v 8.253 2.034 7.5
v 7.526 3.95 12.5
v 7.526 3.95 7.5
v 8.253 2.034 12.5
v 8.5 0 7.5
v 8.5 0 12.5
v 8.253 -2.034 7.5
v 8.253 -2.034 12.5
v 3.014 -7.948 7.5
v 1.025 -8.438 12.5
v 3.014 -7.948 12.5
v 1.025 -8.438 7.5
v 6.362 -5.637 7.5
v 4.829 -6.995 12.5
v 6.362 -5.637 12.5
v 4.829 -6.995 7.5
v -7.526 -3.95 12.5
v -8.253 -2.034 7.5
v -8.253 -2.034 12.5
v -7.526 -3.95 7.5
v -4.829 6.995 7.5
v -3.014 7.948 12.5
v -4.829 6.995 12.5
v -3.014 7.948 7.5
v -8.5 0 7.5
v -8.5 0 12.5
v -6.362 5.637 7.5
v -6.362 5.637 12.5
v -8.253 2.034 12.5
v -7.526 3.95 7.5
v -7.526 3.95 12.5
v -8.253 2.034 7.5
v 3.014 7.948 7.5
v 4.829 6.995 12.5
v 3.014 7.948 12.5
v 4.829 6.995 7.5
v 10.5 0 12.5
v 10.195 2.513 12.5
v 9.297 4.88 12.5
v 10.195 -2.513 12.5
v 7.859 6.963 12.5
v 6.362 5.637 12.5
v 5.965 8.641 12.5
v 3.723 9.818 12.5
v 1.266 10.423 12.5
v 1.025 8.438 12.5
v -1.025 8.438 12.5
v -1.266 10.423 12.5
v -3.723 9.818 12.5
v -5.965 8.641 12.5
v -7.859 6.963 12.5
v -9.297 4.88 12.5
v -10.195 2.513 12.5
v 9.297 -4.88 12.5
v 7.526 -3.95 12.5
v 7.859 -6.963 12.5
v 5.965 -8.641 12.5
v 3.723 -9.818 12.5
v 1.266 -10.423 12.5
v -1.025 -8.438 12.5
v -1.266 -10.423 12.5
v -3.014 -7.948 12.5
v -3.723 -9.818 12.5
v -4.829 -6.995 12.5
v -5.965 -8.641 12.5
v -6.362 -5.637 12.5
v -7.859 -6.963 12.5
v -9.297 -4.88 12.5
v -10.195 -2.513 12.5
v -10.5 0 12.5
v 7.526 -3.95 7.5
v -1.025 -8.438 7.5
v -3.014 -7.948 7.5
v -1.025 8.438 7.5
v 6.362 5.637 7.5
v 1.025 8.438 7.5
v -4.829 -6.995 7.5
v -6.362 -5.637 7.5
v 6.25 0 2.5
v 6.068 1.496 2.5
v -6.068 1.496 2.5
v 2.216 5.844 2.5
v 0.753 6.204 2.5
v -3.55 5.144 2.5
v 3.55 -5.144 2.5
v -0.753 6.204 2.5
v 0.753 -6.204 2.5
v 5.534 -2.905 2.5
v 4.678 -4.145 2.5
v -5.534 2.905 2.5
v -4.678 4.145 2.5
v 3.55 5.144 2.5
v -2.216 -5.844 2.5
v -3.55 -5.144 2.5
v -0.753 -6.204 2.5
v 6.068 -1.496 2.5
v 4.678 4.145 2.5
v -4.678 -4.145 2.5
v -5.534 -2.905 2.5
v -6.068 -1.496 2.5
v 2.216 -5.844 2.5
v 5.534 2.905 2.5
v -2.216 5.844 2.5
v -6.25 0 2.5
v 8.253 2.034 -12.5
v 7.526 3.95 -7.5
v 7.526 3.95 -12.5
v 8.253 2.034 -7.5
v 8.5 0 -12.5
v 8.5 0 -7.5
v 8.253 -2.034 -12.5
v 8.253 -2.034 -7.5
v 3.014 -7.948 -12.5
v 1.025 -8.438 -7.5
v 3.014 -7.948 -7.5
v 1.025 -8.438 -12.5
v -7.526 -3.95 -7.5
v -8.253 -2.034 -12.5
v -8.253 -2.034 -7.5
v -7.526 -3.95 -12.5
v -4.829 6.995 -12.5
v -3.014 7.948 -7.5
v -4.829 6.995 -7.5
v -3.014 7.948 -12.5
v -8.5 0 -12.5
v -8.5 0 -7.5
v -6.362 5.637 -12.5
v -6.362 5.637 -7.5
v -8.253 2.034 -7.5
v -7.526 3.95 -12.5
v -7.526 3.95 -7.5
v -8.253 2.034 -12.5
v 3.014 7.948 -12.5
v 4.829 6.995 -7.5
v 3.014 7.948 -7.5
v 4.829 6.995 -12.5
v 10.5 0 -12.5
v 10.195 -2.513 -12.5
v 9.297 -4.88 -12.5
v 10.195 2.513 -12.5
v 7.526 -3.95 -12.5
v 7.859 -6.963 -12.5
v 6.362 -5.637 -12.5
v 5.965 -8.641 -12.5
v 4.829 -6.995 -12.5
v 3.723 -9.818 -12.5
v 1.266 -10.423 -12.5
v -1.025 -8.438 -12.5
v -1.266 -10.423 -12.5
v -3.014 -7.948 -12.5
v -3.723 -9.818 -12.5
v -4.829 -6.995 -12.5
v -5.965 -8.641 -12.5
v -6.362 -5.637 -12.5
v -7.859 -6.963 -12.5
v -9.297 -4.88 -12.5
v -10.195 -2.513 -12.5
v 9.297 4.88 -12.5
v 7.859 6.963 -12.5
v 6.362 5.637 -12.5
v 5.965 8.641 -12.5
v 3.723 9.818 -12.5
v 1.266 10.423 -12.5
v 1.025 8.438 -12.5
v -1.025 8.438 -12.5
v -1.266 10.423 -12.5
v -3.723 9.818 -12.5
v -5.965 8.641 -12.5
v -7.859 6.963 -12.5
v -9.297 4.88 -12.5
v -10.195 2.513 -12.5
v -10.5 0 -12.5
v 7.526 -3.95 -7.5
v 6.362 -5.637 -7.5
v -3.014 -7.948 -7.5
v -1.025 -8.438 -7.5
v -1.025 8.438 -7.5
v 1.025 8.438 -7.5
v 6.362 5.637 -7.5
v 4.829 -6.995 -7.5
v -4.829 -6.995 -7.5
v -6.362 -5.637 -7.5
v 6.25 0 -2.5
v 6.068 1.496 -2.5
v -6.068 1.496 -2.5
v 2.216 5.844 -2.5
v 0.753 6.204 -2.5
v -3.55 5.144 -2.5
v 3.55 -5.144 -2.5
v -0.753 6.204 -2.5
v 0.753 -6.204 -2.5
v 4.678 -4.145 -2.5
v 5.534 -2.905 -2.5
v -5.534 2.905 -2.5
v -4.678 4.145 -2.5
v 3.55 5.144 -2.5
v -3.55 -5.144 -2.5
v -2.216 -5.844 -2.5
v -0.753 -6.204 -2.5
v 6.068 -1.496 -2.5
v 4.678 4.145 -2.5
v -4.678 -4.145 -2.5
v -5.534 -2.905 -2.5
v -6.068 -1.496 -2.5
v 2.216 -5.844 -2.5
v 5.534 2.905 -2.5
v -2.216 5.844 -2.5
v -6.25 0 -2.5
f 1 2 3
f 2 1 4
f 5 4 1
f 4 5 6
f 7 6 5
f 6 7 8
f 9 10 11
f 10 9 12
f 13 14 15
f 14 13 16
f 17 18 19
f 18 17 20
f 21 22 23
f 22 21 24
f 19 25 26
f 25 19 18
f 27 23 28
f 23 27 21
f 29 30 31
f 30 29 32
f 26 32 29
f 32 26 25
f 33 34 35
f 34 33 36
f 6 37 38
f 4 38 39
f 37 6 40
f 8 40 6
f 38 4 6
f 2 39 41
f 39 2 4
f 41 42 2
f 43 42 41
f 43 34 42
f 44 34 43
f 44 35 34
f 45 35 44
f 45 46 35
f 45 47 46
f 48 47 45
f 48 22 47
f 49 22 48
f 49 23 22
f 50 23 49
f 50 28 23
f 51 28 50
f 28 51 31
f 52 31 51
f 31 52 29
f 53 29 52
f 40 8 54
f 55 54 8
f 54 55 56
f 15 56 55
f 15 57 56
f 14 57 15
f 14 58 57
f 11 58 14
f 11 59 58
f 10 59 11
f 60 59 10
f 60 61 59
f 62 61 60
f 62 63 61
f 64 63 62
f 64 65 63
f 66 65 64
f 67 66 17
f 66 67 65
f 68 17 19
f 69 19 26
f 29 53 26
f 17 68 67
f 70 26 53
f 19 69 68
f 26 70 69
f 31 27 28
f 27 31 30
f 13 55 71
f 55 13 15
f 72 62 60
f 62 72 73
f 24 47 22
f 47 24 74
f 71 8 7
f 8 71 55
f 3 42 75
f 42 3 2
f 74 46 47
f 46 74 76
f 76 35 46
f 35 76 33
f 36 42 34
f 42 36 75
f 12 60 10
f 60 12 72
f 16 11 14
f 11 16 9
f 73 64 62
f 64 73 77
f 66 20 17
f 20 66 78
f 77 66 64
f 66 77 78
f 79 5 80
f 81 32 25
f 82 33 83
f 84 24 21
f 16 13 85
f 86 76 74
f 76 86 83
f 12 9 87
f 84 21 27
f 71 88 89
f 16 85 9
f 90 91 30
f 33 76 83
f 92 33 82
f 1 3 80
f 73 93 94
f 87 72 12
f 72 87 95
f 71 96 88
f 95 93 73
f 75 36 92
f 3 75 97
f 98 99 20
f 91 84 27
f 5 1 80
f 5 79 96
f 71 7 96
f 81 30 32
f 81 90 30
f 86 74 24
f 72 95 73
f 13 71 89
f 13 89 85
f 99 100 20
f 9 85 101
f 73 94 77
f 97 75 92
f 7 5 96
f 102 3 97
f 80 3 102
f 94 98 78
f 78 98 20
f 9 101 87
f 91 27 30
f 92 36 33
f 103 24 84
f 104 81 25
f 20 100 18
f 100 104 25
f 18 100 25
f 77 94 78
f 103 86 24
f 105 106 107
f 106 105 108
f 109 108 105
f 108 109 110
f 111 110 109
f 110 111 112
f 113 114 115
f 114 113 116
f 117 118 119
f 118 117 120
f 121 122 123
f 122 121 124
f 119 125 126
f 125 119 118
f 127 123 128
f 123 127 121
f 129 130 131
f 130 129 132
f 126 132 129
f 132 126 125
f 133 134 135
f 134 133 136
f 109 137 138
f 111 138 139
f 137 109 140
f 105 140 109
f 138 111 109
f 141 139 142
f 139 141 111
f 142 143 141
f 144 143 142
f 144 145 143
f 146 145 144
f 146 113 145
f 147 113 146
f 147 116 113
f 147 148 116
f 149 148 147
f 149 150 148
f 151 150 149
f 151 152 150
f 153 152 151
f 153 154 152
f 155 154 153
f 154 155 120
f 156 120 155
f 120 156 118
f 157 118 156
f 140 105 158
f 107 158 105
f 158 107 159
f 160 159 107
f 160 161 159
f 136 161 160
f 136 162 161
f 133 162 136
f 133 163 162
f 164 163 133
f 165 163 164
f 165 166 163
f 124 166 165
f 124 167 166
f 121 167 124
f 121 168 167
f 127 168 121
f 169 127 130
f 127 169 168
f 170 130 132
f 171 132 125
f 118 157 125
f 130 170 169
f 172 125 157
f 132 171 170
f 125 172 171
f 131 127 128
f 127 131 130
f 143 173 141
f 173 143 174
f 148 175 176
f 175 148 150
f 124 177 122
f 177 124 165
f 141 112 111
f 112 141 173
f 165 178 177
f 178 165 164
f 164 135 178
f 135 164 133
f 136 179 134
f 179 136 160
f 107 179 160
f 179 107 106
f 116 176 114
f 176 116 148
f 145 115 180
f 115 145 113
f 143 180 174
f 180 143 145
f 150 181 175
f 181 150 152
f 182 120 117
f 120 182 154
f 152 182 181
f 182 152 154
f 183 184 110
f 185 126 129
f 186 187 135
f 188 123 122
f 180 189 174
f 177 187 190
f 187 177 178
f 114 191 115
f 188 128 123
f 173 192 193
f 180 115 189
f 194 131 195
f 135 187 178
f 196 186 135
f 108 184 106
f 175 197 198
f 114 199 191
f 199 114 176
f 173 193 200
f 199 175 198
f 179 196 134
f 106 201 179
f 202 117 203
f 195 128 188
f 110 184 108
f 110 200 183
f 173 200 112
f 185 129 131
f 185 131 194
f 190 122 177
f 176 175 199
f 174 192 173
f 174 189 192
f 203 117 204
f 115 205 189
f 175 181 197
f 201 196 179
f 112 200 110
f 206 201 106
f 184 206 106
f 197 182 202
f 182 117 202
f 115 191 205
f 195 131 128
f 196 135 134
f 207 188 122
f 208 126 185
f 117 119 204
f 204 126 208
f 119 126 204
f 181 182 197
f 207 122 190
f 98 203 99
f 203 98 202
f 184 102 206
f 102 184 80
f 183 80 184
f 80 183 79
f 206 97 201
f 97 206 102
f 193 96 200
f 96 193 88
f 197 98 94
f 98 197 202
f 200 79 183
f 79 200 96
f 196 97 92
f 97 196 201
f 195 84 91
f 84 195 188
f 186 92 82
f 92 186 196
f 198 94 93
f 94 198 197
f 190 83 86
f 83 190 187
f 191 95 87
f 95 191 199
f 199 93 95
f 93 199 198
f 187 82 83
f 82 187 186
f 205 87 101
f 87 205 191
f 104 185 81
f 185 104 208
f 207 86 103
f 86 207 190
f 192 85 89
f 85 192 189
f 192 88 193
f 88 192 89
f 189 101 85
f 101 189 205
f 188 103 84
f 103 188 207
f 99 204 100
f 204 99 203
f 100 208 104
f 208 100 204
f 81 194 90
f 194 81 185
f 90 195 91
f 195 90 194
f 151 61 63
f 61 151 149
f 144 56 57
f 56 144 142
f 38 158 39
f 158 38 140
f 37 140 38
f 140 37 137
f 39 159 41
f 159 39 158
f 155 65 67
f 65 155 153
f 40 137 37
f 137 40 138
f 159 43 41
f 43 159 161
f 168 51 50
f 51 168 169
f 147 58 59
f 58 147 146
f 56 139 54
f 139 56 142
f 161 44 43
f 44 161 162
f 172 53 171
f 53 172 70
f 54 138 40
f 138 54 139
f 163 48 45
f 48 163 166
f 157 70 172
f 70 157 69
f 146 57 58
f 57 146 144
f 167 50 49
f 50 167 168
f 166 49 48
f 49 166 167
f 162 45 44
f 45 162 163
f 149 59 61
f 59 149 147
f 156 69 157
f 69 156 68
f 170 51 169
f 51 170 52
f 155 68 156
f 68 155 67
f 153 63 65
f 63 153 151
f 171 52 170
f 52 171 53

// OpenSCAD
// file: parameters.scad
/******************************************************/
/* PLYUMP                                             */
/* file: parameters.scad                              */
/* author: Luis Rodriguez                             */
/* version: 0.32                                      */
/* w3b: tiny.cc/lyu                                   */
/* info: This file contains all the shared parameters */
/******************************************************/

birthday_day = 26;

/* Bearings dimensions (mm) */
bearings_clearance = 0.5; 	// Used to "easily fit bearings into their holes"
// 608zz id=8 od=22 thickness=7
608zz_inside_diameter = 8;
608zz_outside_diameter = 22;
608zz_thickness = 7;

// 624zz id=4 od=13 thickness=5
624zz_inside_diameter = 4;
624zz_outside_diameter = 13;
624zz_thickness = 5;

/* NEMA 17 */
nema_17_height = 42.2;
nema_17_screw_distance = 31.04;
nema_rollers_clearance = 3;

/* ROLLERS */
rollers_number = 6;
rollers_clearance = 4;
rollers_angle = 360 / ( rollers_number );
rollers_wall = 0;
rollers_diameter = 624zz_outside_diameter + rollers_wall * 2;
rollers_radius = rollers_diameter / 2;
rollers_shaft_diameter = 624zz_inside_diameter + bearings_clearance;
rollers_bearings_contacts_thickness = 2;
rollers_bearings_contacts_height = 3;

rollers_width = 624zz_thickness * 5;
rollers_easy_printing_inverted_cone_thickness = 624zz_thickness;

rollers_holder_thickness = 624zz_thickness/2;
rollers_holder_central_bearing_support_thickness = 3;
rollers_holder_central_bearing_support_height = 624zz_thickness;

rollers_radius_plus_clearance = rollers_radius + rollers_clearance / 2;
rollers_position_minimum_radius_minus_roller_radius = ( rollers_radius_plus_clearance - sin( rollers_angle / 2 ) 
	* rollers_radius_plus_clearance ) / sin( rollers_angle / 2 ) ;

if ( rollers_position_minimum_radius_minus_roller_radius < 608zz_inside_diameter) {

	echo(str(" THE ROLLERS WILL CRASH THE CENTRAL SHAFT, change the rollers_position_minimum_radius; " ) );
}

//rollers_position_minimum_radius = 608zz_inside_diameter + rollers_radius;
rollers_position_minimum_radius = rollers_position_minimum_radius_minus_roller_radius + rollers_radius;
echo(str("Rollers position radius = ", rollers_position_minimum_radius ) );

rollers_exterior_radius = rollers_position_minimum_radius + rollers_radius;
echo(str("Rollers exterior radius = ", rollers_exterior_radius ) );

/* Gears */
// Common
gear_ratio = 3;
gear_motor_teeth = 11;
gear_peristaltic_teeth = gear_ratio*gear_motor_teeth;
gear_peristaltic_thickness = 608zz_thickness * 2; // "*2" due to herringbone!

// Circular pitch is calculate through pitch radius for peristaltic and motor gear
// in order to avoid rollers crashing nema 17 motor
//
// 		nema_17_height + rollers_position_minimum_radius + rollers_radius + nema_rollers_clearance = 
// 		gear_peristaltic_pitch_radius + gear_motor_pitch_radius
//
//		gear_peristaltic_pitch_radius + gear_motor_pitch_radius =
//		gear_peristaltic_teeth * circular_pitch / 360 + gear_motor_teeth * circular_pitch / 360 =
//		(gear_peristaltic_teeth + gear_motor_teeth)/360 * circular_pitch
//
//		circular_pitch = 
//		360*(nema_17_height + rollers_position_minimum_radius + rollers_radius + nema_rollers_clearance) /
//		(gear_peristaltic_teeth + gear_motor_teeth)	

//circular_pitch = 360*gear_peristaltic_radius/gear_peristaltic_teeth;
circular_pitch = 360 * (nema_17_height/2 + rollers_position_minimum_radius + rollers_radius + nema_rollers_clearance) /
		(gear_peristaltic_teeth + gear_motor_teeth);

// Pitch diameter: Diameter of pitch circle.
gear_peristaltic_pitch_diameter = gear_peristaltic_teeth * circular_pitch / 180;
gear_peristaltic_pitch_radius = gear_peristaltic_pitch_diameter/2;
echo(str("Pitch radius gear peristaltic= ",gear_peristaltic_pitch_radius));
// Diametrial pitch: Number of teeth per unit length.
gear_peristaltic_pitch_diametrial = gear_peristaltic_teeth / gear_peristaltic_pitch_diameter;
// Addendum: Radial distance from pitch circle to outside circle.
gear_peristaltic_addendum = 1/gear_peristaltic_pitch_diametrial;
//Outer Circle
gear_peristaltic_outside_radius = gear_peristaltic_pitch_radius+gear_peristaltic_addendum;
echo(str("Outside radius gear peristaltic= ",gear_peristaltic_outside_radius));

gear_motor_height = 8;
gear_motor_neck_height = 10;
gear_motor_neck_diameter = 18;
gear_motor_thickness = 608zz_thickness * 2; // "*2" due to herringbone!
gear_motor_shaft_diameter = 5.5;

// Pitch diameter: Diameter of pitch circle.
gear_motor_pitch_diameter = gear_motor_teeth * circular_pitch / 180;
gear_motor_pitch_radius = gear_motor_pitch_diameter/2;
echo(str("Pitch radius gear motor= ",gear_motor_pitch_radius));
// Diametrial pitch: Number of teeth per unit length.
gear_motor_pitch_diametrial = gear_motor_teeth / gear_motor_pitch_diameter;
// Addendum: Radial distance from pitch circle to outside circle.
gear_motor_addendum = 1/gear_motor_pitch_diametrial;
//Outer Circle
gear_motor_outside_radius = gear_motor_pitch_radius+gear_motor_addendum;
echo(str("Outside radius gear motor= ",gear_motor_outside_radius));

pressure_angle=30;
twist=200;

gear_motor_bolt_width = 3;
gear_motor_bolt_length = 5.8;

3mm_screw_radius = 3.4/2;

pinched_tube = 3;
// main file
/******************************************************/
/* PLYUMP                                             */
/* file: rollers.scad                                 */
/* author: Luis Rodriguez                             */
/* version: 0.3                                       */
/* w3b: tiny.cc/lyu                                   */
/* info:                                              */
/******************************************************/
include <parameters.scad>

// Testing
rollers();

/* MODULES */

module rollers(){
	difference(){
		union(){ // Add
			rollers_body();

			
		}
		union(){ // Substract
			rollers_shaft();
			rollers_bearings();
			mirror([0, 0, 1]) 
				rollers_bearings();
		}
	}
}

module rollers_body(){
	color("Cyan")
		cylinder(r=rollers_radius + rollers_clearance, h=rollers_width, $fn=birthday_day, center=true);
}

module rollers_shaft(){
	color("Red")
		cylinder(r=rollers_shaft_diameter/2 + rollers_clearance, h=rollers_width * 2, $fn=birthday_day, center=true);
}

module rollers_bearings(){
	translate([0, 0, rollers_width/2 - rollers_easy_printing_inverted_cone_thickness/2 ]) 
		cylinder(r=(624zz_outside_diameter+rollers_clearance)/2, h=624zz_thickness, $fn=birthday_day, center=true);

	color("Aqua")	
	translate([0, 0, rollers_width/2 - 624zz_thickness - 624zz_thickness/2 ]) 
		#cylinder(	r2=(624zz_outside_diameter+rollers_clearance)/2,
					r1=rollers_shaft_diameter/2 + rollers_clearance,
					 h=rollers_easy_printing_inverted_cone_thickness, 
					 $fn=birthday_day, center=true);
}
